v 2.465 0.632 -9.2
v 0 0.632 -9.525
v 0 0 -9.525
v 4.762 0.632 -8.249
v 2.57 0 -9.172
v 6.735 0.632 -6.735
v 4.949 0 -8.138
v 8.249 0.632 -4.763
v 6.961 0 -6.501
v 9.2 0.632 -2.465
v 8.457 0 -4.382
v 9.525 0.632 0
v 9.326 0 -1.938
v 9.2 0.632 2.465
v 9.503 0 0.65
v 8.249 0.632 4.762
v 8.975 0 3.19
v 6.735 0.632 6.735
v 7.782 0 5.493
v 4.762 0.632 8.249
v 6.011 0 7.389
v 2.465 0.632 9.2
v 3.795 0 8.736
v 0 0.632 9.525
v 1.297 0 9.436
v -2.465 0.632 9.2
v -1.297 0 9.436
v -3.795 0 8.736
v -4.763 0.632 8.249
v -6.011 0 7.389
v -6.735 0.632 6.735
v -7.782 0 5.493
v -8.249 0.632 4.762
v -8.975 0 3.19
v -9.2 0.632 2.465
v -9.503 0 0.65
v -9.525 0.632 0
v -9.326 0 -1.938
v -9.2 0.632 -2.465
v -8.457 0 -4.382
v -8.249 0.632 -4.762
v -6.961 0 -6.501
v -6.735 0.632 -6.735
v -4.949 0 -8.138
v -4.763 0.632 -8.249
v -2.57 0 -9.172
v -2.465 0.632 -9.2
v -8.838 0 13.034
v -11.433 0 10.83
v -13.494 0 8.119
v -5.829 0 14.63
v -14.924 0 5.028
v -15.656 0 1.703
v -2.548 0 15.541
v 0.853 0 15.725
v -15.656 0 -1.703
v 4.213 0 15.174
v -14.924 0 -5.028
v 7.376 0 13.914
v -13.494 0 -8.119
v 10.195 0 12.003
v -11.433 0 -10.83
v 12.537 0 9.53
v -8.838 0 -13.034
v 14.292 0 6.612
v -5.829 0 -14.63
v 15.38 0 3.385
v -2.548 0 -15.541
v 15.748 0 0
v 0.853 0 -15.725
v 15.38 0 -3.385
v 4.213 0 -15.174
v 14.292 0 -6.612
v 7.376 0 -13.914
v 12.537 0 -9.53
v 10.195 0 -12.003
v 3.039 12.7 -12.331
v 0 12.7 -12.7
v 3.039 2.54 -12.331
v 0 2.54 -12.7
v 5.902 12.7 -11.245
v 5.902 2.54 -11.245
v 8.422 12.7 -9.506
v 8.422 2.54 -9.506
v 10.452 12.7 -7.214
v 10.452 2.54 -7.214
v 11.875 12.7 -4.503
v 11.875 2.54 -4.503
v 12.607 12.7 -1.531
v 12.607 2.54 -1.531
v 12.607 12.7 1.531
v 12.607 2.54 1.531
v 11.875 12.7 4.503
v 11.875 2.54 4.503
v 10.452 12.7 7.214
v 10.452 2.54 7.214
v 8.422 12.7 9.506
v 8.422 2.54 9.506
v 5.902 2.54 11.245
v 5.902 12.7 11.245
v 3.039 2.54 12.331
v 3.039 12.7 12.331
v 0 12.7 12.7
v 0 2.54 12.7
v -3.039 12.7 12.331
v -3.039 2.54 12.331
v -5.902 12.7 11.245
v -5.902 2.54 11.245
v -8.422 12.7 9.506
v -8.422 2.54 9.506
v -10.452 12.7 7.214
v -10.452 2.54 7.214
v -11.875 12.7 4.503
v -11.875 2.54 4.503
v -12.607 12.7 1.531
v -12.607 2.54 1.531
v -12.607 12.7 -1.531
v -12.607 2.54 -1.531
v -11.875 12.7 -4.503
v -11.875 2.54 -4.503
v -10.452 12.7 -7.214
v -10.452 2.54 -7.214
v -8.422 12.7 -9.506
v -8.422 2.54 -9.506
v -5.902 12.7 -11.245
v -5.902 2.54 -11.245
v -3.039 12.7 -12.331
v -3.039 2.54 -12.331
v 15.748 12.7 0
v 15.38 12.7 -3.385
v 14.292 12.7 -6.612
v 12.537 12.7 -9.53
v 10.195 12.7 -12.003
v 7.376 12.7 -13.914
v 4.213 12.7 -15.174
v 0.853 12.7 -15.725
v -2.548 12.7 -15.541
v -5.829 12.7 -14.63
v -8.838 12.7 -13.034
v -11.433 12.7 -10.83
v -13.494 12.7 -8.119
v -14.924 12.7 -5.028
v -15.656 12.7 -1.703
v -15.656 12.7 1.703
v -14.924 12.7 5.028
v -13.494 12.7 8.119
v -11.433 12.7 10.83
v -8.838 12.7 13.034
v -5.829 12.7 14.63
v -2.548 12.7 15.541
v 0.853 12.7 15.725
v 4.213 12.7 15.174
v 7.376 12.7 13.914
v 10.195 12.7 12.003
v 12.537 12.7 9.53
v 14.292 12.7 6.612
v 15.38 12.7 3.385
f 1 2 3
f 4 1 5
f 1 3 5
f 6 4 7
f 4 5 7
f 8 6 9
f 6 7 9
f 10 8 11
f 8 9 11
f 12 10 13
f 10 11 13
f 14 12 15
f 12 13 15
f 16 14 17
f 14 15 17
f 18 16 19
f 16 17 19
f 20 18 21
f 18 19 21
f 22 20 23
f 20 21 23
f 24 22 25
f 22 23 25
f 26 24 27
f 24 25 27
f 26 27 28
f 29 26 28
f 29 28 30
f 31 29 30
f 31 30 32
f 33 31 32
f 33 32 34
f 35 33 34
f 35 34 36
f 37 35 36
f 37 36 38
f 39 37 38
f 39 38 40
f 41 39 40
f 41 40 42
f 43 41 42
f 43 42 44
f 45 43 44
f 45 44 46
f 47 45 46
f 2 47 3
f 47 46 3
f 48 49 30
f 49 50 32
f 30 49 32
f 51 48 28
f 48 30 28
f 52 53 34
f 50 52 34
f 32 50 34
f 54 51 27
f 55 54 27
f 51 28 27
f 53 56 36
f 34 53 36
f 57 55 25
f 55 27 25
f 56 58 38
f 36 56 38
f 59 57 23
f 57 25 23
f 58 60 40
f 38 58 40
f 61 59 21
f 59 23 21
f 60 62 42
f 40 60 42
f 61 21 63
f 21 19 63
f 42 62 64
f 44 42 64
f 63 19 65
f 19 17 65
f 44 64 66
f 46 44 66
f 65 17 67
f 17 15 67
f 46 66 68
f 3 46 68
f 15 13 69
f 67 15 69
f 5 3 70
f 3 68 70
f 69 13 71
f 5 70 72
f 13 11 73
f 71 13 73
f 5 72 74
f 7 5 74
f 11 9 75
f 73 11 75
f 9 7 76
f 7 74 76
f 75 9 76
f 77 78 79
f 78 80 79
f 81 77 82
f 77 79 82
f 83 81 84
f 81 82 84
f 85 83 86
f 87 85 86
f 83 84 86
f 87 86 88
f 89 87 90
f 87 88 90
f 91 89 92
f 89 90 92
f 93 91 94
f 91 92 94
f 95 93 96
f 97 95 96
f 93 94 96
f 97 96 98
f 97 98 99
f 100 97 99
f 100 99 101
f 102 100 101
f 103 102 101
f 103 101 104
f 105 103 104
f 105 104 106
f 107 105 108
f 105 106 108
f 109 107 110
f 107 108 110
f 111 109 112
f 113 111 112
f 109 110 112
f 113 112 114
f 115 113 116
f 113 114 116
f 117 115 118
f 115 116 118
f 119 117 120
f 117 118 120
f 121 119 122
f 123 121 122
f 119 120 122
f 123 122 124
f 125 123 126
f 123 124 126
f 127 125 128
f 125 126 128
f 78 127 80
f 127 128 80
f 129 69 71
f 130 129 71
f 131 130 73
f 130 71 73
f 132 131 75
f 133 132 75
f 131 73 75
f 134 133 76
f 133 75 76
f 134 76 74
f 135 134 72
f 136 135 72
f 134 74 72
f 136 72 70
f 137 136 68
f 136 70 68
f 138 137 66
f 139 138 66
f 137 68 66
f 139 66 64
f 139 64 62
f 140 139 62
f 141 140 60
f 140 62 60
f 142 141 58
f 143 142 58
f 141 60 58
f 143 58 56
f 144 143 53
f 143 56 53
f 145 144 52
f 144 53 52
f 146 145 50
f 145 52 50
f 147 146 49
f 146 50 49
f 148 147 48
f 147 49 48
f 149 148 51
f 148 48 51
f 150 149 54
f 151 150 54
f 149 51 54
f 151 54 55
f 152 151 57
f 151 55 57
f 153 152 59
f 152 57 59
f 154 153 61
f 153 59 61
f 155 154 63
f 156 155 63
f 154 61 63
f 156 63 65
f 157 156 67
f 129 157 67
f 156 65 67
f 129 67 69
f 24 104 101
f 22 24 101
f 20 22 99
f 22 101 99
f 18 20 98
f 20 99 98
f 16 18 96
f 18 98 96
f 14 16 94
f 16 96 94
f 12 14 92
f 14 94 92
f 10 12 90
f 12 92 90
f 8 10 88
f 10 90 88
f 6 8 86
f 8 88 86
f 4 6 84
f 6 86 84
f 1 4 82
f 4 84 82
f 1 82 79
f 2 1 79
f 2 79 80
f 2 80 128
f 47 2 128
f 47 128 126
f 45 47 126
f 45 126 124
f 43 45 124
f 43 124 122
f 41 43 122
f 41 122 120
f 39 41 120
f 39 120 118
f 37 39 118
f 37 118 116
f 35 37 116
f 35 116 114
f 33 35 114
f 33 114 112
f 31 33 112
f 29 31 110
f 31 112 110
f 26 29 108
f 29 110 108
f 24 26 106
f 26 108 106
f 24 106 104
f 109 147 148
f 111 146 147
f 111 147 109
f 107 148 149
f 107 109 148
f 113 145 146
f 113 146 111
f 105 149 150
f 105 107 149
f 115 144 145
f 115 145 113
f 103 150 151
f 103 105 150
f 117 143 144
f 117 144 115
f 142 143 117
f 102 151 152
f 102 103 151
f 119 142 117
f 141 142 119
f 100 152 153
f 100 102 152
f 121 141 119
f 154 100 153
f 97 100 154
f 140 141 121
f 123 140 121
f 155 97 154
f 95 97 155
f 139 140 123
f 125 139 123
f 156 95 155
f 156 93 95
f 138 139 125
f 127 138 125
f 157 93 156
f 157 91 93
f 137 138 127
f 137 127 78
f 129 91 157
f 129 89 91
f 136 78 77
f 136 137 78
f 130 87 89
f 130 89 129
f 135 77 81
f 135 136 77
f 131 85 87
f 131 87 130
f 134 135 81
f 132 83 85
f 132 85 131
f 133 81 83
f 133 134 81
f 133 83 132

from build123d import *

# Parameters (mm, degrees)
SKETCH1_R                   = 15.748
BOSS_EXTRUDE1_DEPTH         = 12.7
F_1_1_DIAMETER_HOLE1_D      = 25.4
F_1_1_DIAMETER_HOLE1_DEPTH  = 10.16
F_1_1_DIAMETER_HOLE1_TIP    = 7.630929862
F_3_4_0_75_DIAMETER_HOLE1_D = 19.05


with BuildPart() as part:
    # Sketch1 → Boss-Extrude1 (new body)
    with BuildSketch(Plane(origin=(0, 0, 0), x_dir=(1, 0, 0), z_dir=(0, 1, 0))):
        Circle(SKETCH1_R)
    extrude(amount=BOSS_EXTRUDE1_DEPTH)

    # 1 (1) Diameter Hole1
    with Locations(Plane.ZX.offset(12.7)):
        with Locations((0, 0)):
            Hole(F_1_1_DIAMETER_HOLE1_D / 2, depth=F_1_1_DIAMETER_HOLE1_DEPTH)
            with Locations((0, 0, -(F_1_1_DIAMETER_HOLE1_DEPTH + F_1_1_DIAMETER_HOLE1_TIP / 2))):  # 118° drill point
                Cone(0, F_1_1_DIAMETER_HOLE1_D / 2, F_1_1_DIAMETER_HOLE1_TIP, mode=Mode.SUBTRACT)

    # 3/4 (0.75) Diameter Hole1 (through all)
    with Locations(Plane.ZX.offset(12.7)):
        with Locations((0, 0)):
            Hole(F_3_4_0_75_DIAMETER_HOLE1_D / 2)


solid = part.part
